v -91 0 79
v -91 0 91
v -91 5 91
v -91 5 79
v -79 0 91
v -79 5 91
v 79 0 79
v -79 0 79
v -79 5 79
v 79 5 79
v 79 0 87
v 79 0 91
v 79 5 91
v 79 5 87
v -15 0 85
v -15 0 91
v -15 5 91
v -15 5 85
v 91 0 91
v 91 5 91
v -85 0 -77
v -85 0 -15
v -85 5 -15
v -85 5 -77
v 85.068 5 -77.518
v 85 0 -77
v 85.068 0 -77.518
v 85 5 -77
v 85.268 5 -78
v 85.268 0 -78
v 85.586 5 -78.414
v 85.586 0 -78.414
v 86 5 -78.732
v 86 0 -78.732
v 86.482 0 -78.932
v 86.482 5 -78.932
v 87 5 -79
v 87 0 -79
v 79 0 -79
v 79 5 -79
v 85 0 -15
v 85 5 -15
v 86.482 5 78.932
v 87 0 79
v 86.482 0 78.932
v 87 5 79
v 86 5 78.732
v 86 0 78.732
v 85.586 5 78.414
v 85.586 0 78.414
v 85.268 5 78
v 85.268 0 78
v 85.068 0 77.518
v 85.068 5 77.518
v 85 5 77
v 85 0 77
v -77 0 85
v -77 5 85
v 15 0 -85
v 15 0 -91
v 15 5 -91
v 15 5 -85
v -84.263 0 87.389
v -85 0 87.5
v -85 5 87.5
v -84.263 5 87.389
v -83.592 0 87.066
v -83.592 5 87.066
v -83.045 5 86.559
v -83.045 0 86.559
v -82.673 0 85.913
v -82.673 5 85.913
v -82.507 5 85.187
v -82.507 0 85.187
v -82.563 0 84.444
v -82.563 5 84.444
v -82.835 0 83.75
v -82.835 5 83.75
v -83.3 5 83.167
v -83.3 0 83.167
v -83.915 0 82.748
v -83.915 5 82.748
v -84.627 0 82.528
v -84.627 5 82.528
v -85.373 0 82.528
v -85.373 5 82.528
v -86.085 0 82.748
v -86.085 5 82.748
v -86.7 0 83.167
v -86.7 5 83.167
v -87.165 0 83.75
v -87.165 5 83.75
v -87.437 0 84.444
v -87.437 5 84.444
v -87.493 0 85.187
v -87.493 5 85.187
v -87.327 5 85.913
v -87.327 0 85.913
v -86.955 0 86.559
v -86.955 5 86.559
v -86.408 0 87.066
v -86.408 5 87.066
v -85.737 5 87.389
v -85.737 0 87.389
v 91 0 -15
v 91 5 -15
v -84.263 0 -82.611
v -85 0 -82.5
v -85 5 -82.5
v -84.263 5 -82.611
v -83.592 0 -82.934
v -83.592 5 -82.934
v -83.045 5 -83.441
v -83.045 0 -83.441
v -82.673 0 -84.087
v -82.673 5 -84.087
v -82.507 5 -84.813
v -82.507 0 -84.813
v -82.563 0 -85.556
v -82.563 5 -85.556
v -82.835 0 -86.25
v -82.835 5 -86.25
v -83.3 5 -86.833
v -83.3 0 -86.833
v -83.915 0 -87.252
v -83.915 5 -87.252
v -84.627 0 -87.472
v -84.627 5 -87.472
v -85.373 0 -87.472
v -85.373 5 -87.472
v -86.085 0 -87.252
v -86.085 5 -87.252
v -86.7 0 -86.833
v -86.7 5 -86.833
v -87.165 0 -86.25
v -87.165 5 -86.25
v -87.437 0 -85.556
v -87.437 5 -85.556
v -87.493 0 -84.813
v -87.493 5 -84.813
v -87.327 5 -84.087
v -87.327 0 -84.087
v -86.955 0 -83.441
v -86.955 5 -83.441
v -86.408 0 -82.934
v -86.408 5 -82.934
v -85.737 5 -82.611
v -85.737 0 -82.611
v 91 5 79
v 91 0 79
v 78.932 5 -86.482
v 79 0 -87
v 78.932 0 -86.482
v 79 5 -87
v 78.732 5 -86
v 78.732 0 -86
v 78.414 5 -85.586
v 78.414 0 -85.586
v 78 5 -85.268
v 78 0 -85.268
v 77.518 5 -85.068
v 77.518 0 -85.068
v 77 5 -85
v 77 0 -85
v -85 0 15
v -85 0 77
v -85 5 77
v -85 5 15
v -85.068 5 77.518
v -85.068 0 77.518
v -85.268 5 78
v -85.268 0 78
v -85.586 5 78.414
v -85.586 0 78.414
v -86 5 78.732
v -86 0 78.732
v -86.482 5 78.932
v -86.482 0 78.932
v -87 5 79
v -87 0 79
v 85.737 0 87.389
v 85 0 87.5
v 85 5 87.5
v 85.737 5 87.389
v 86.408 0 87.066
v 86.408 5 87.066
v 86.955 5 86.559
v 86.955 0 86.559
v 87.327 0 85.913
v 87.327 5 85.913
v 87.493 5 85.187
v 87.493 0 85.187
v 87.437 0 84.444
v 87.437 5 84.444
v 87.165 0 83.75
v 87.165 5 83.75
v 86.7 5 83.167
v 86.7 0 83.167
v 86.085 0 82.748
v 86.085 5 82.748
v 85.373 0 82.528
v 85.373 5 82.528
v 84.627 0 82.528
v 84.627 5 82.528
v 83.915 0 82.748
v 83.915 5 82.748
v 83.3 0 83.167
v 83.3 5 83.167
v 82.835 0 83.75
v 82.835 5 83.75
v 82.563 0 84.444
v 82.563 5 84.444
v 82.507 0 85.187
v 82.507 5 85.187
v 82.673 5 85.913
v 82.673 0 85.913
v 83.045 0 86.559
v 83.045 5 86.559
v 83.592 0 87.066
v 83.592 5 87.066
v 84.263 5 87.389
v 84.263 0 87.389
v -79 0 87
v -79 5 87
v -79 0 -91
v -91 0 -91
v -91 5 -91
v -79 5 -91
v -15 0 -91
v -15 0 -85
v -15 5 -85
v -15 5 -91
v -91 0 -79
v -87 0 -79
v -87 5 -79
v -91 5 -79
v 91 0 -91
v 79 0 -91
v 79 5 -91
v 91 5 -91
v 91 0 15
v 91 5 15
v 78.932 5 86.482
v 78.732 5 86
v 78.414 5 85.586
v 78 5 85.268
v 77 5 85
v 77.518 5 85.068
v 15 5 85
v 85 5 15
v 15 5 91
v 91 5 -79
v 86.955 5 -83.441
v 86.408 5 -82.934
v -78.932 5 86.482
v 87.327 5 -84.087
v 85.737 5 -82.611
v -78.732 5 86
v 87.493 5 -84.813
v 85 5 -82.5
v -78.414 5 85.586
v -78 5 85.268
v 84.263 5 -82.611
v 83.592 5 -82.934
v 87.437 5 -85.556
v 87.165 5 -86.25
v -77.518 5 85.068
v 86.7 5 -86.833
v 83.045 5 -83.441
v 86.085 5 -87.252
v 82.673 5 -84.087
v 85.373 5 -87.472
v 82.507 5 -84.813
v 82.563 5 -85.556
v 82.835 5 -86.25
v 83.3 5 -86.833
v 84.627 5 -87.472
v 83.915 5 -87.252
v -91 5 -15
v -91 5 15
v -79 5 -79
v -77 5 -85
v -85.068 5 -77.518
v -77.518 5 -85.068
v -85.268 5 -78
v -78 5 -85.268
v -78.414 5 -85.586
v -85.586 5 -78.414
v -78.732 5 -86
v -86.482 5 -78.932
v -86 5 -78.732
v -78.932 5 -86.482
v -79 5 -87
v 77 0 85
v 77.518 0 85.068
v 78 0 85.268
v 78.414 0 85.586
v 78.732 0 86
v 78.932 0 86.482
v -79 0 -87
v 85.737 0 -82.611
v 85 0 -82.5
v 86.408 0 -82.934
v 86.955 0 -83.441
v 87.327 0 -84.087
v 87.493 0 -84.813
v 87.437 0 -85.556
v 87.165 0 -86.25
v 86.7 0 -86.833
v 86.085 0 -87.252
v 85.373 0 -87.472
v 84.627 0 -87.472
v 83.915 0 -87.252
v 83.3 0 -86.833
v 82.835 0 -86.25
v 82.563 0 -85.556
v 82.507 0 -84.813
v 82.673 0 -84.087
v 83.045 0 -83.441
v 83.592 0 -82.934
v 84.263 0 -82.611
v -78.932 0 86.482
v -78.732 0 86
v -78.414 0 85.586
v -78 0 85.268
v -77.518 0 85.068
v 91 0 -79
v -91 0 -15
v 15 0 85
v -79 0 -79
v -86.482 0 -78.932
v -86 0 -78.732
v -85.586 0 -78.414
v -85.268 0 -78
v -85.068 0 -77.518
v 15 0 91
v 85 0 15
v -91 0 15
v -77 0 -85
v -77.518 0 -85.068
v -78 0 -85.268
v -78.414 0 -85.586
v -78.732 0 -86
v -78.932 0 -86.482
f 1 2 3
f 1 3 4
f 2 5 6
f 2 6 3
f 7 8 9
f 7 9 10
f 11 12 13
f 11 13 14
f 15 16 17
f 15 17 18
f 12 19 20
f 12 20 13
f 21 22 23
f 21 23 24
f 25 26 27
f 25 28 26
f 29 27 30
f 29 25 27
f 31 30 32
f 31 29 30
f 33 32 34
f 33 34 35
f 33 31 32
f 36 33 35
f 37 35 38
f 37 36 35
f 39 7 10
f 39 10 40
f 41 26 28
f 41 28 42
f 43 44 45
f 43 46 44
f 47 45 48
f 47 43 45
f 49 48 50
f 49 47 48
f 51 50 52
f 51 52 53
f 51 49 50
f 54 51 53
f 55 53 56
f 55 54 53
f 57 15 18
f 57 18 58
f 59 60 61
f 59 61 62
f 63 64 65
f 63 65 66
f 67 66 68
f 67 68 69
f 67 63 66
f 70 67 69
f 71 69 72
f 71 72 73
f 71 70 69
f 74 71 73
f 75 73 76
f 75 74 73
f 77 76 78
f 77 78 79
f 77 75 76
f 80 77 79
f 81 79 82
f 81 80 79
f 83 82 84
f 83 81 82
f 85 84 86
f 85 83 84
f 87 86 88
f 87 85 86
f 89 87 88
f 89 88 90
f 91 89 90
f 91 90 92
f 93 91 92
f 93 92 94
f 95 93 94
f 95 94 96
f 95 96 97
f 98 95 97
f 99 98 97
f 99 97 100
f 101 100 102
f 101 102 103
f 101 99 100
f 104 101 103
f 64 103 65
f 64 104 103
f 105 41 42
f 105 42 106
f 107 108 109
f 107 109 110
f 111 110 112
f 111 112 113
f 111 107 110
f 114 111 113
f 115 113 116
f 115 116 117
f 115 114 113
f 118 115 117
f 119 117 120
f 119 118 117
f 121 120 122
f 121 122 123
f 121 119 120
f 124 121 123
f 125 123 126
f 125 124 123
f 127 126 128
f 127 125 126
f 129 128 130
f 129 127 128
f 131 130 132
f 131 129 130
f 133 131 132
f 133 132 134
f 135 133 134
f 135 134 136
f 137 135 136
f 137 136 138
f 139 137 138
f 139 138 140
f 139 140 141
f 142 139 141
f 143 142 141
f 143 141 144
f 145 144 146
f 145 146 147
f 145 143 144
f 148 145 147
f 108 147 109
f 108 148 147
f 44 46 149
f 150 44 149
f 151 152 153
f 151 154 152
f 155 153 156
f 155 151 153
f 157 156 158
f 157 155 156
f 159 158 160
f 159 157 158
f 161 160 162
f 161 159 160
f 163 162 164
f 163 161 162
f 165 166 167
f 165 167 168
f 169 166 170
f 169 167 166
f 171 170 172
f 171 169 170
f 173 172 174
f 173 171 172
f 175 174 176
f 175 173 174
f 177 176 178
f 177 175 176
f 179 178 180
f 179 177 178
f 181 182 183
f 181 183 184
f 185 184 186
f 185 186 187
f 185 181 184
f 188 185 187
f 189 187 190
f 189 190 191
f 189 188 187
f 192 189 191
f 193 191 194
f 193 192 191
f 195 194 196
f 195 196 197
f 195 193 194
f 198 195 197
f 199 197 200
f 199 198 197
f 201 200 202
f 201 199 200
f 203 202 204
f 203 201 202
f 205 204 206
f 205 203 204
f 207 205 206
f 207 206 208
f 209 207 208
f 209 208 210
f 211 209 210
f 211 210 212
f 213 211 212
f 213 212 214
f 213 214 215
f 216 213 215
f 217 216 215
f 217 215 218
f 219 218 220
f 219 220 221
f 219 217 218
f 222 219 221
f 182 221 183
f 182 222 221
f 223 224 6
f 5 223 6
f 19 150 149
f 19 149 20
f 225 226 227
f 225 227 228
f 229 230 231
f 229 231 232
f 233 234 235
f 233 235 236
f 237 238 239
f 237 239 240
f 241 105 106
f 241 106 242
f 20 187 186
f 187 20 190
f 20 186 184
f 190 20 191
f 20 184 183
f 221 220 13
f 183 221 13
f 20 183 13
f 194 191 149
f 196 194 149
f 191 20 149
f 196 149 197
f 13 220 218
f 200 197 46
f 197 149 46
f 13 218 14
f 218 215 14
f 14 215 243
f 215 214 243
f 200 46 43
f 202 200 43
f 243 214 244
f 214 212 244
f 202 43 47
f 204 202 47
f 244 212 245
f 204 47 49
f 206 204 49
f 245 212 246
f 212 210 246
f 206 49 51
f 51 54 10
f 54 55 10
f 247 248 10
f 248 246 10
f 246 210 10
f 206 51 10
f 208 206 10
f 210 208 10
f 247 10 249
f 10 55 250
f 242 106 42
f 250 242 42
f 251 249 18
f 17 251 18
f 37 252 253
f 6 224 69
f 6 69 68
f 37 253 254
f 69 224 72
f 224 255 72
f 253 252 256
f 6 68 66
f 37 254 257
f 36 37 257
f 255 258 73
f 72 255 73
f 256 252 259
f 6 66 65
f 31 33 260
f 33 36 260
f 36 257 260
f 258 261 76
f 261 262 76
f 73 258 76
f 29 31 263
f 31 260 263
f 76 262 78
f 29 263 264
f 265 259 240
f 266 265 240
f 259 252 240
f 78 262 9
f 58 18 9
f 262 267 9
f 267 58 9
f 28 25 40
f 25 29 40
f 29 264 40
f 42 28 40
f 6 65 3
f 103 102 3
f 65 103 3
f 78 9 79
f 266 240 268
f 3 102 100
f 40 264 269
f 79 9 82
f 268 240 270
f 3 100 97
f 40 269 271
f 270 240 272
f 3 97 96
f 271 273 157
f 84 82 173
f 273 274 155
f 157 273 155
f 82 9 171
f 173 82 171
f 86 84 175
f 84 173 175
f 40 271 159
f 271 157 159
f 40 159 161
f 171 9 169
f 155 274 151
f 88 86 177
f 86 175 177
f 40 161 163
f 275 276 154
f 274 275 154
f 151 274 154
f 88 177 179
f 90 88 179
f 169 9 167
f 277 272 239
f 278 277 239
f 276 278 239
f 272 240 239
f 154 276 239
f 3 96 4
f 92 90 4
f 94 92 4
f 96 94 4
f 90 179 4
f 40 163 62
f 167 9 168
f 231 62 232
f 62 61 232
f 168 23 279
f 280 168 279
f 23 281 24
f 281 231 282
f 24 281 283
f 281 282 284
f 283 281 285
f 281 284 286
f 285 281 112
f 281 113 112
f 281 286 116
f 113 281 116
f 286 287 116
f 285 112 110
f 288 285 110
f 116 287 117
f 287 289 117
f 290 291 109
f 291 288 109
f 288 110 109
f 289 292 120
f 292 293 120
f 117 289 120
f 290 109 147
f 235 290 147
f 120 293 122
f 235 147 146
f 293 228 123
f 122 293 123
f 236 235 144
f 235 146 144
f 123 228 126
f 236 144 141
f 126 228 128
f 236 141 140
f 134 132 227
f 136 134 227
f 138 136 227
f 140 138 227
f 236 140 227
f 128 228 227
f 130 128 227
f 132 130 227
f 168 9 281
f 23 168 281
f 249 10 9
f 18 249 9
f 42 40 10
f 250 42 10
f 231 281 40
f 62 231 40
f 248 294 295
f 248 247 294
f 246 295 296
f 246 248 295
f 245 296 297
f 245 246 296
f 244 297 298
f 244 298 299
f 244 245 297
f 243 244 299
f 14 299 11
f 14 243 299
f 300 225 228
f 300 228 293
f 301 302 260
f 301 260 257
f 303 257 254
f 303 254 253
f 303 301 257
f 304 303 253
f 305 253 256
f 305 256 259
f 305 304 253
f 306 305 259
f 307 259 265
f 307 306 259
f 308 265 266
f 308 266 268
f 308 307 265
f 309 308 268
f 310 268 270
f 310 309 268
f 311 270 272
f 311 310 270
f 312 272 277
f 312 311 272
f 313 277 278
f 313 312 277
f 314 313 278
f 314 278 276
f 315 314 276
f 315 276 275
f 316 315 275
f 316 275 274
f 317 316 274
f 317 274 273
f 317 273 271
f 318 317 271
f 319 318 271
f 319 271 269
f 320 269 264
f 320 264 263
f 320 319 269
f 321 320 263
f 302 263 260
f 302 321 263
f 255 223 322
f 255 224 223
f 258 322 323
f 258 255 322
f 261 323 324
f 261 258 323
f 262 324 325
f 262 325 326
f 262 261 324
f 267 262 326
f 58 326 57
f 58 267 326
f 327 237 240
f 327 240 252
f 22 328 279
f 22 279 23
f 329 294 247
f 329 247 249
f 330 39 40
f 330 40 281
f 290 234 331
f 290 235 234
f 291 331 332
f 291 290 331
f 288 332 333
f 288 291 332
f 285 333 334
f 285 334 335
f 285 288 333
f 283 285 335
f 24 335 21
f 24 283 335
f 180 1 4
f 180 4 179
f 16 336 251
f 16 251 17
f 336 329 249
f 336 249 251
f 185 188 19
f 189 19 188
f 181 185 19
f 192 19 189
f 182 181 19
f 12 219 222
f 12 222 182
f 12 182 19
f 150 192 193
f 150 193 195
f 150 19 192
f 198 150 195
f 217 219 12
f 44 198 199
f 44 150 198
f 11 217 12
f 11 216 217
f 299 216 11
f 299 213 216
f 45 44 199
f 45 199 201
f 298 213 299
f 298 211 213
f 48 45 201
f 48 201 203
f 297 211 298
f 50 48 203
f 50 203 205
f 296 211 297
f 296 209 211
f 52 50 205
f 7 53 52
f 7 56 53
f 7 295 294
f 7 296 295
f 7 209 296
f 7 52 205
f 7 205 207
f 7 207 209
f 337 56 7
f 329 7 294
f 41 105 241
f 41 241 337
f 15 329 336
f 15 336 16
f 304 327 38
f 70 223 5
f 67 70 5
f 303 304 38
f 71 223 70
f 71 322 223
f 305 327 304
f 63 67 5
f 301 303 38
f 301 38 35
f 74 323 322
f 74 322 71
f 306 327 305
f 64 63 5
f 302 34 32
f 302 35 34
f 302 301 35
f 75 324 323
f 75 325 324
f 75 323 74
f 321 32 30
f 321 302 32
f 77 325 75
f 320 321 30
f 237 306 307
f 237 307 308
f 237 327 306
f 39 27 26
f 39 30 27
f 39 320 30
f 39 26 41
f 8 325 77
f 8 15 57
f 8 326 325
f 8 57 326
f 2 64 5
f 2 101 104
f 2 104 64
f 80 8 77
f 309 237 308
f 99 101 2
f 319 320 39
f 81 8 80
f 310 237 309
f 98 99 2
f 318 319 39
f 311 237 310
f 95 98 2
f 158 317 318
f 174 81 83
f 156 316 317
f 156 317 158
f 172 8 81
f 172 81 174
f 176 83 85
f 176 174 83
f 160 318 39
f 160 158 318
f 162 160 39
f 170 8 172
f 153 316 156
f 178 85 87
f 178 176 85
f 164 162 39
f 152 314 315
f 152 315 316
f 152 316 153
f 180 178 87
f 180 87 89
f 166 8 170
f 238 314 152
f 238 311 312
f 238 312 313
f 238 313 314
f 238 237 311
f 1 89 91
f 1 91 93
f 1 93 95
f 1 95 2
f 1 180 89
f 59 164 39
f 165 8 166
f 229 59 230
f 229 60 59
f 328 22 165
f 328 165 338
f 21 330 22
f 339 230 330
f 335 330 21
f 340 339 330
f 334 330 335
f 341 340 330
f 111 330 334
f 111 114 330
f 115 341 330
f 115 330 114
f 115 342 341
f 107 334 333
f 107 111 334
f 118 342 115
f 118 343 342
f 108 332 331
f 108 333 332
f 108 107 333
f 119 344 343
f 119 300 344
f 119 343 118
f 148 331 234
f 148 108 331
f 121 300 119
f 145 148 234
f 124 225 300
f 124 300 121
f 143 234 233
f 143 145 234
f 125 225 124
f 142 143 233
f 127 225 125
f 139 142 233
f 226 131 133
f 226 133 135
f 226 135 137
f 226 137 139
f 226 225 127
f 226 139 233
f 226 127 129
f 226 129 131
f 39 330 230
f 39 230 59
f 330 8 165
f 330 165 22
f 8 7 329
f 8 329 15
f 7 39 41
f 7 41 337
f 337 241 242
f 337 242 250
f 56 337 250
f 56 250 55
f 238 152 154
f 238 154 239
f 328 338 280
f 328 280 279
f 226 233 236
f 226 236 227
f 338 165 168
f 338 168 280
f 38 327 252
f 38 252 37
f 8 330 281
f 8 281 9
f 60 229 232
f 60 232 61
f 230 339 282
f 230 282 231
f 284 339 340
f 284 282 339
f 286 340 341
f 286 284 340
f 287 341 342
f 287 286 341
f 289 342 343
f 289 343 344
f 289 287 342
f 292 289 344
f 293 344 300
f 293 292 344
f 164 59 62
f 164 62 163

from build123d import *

# Parameters (mm, degrees)
CROQUIS1_R              = 2.5
SALIENTE_EXTRUIR1_DEPTH = 5
REDONDEO1_R             = 2


with BuildPart() as part:
    # Croquis1 → Saliente-Extruir1 (new body)
    # profile 1 of 4: a face of its own
    with BuildSketch(Plane(origin=(0, 0, 0), x_dir=(1, 0, 0), z_dir=(0, 1, 0))):
        Polygon((0, 79), (0, 91), (15, 91), (15, 85), (79, 85), (79, 91), (91, 91), (91, 79), (85, 79), (85, 15), (91, 15), (91, 0), (79, 0), (79, 79), align=None)
        with Locations(Location((85, 85, 0), (0, 0, 270))):
            Circle(CROQUIS1_R, mode=Mode.SUBTRACT)
    # profile 2 of 4: a face of its own
    with BuildSketch(Plane(origin=(0, 0, 0), x_dir=(1, 0, 0), z_dir=(0, 1, 0))):
        Polygon((79, 0), (91, 0), (91, -15), (85, -15), (85, -79), (91, -79), (91, -91), (79, -91), (79, -85), (15, -85), (15, -91), (0, -91), (0, -79), (79, -79), align=None)
        with Locations(Location((85, -85, 0), (0, 0, 270))):
            Circle(CROQUIS1_R, mode=Mode.SUBTRACT)
    # profile 3 of 4: a face of its own
    with BuildSketch(Plane(origin=(0, 0, 0), x_dir=(1, 0, 0), z_dir=(0, 1, 0))):
        Polygon((0, -79), (0, -91), (-15, -91), (-15, -85), (-79, -85), (-79, -91), (-91, -91), (-91, -79), (-85, -79), (-85, -15), (-91, -15), (-91, 0), (-79, 0), (-79, -79), align=None)
        with Locations(Location((-85, -85, 0), (0, 0, 270))):
            Circle(CROQUIS1_R, mode=Mode.SUBTRACT)
    # profile 4 of 4: a face of its own
    with BuildSketch(Plane(origin=(0, 0, 0), x_dir=(1, 0, 0), z_dir=(0, 1, 0))):
        Polygon((0, 79), (-79, 79), (-79, 0), (-91, 0), (-91, 15), (-85, 15), (-85, 79), (-91, 79), (-91, 91), (-79, 91), (-79, 85), (-15, 85), (-15, 91), (0, 91), align=None)
        with Locations(Location((-85, 85, 0), (0, 0, 270))):
            Circle(CROQUIS1_R, mode=Mode.SUBTRACT)
    extrude(amount=SALIENTE_EXTRUIR1_DEPTH)

    # Redondeo1
    redondeo1_edges = [part.edges().sort_by_distance(p)[0] for p in [
        (79, 2.5, -85),
        (85, 2.5, -79),
        (85, 2.5, 79),
        (79, 2.5, 85),
        (-79, 2.5, 85),
        (-85, 2.5, 79),
        (-85, 2.5, -79),
        (-79, 2.5, -85),
    ]]
    fillet(redondeo1_edges, radius=REDONDEO1_R)


solid = part.part
